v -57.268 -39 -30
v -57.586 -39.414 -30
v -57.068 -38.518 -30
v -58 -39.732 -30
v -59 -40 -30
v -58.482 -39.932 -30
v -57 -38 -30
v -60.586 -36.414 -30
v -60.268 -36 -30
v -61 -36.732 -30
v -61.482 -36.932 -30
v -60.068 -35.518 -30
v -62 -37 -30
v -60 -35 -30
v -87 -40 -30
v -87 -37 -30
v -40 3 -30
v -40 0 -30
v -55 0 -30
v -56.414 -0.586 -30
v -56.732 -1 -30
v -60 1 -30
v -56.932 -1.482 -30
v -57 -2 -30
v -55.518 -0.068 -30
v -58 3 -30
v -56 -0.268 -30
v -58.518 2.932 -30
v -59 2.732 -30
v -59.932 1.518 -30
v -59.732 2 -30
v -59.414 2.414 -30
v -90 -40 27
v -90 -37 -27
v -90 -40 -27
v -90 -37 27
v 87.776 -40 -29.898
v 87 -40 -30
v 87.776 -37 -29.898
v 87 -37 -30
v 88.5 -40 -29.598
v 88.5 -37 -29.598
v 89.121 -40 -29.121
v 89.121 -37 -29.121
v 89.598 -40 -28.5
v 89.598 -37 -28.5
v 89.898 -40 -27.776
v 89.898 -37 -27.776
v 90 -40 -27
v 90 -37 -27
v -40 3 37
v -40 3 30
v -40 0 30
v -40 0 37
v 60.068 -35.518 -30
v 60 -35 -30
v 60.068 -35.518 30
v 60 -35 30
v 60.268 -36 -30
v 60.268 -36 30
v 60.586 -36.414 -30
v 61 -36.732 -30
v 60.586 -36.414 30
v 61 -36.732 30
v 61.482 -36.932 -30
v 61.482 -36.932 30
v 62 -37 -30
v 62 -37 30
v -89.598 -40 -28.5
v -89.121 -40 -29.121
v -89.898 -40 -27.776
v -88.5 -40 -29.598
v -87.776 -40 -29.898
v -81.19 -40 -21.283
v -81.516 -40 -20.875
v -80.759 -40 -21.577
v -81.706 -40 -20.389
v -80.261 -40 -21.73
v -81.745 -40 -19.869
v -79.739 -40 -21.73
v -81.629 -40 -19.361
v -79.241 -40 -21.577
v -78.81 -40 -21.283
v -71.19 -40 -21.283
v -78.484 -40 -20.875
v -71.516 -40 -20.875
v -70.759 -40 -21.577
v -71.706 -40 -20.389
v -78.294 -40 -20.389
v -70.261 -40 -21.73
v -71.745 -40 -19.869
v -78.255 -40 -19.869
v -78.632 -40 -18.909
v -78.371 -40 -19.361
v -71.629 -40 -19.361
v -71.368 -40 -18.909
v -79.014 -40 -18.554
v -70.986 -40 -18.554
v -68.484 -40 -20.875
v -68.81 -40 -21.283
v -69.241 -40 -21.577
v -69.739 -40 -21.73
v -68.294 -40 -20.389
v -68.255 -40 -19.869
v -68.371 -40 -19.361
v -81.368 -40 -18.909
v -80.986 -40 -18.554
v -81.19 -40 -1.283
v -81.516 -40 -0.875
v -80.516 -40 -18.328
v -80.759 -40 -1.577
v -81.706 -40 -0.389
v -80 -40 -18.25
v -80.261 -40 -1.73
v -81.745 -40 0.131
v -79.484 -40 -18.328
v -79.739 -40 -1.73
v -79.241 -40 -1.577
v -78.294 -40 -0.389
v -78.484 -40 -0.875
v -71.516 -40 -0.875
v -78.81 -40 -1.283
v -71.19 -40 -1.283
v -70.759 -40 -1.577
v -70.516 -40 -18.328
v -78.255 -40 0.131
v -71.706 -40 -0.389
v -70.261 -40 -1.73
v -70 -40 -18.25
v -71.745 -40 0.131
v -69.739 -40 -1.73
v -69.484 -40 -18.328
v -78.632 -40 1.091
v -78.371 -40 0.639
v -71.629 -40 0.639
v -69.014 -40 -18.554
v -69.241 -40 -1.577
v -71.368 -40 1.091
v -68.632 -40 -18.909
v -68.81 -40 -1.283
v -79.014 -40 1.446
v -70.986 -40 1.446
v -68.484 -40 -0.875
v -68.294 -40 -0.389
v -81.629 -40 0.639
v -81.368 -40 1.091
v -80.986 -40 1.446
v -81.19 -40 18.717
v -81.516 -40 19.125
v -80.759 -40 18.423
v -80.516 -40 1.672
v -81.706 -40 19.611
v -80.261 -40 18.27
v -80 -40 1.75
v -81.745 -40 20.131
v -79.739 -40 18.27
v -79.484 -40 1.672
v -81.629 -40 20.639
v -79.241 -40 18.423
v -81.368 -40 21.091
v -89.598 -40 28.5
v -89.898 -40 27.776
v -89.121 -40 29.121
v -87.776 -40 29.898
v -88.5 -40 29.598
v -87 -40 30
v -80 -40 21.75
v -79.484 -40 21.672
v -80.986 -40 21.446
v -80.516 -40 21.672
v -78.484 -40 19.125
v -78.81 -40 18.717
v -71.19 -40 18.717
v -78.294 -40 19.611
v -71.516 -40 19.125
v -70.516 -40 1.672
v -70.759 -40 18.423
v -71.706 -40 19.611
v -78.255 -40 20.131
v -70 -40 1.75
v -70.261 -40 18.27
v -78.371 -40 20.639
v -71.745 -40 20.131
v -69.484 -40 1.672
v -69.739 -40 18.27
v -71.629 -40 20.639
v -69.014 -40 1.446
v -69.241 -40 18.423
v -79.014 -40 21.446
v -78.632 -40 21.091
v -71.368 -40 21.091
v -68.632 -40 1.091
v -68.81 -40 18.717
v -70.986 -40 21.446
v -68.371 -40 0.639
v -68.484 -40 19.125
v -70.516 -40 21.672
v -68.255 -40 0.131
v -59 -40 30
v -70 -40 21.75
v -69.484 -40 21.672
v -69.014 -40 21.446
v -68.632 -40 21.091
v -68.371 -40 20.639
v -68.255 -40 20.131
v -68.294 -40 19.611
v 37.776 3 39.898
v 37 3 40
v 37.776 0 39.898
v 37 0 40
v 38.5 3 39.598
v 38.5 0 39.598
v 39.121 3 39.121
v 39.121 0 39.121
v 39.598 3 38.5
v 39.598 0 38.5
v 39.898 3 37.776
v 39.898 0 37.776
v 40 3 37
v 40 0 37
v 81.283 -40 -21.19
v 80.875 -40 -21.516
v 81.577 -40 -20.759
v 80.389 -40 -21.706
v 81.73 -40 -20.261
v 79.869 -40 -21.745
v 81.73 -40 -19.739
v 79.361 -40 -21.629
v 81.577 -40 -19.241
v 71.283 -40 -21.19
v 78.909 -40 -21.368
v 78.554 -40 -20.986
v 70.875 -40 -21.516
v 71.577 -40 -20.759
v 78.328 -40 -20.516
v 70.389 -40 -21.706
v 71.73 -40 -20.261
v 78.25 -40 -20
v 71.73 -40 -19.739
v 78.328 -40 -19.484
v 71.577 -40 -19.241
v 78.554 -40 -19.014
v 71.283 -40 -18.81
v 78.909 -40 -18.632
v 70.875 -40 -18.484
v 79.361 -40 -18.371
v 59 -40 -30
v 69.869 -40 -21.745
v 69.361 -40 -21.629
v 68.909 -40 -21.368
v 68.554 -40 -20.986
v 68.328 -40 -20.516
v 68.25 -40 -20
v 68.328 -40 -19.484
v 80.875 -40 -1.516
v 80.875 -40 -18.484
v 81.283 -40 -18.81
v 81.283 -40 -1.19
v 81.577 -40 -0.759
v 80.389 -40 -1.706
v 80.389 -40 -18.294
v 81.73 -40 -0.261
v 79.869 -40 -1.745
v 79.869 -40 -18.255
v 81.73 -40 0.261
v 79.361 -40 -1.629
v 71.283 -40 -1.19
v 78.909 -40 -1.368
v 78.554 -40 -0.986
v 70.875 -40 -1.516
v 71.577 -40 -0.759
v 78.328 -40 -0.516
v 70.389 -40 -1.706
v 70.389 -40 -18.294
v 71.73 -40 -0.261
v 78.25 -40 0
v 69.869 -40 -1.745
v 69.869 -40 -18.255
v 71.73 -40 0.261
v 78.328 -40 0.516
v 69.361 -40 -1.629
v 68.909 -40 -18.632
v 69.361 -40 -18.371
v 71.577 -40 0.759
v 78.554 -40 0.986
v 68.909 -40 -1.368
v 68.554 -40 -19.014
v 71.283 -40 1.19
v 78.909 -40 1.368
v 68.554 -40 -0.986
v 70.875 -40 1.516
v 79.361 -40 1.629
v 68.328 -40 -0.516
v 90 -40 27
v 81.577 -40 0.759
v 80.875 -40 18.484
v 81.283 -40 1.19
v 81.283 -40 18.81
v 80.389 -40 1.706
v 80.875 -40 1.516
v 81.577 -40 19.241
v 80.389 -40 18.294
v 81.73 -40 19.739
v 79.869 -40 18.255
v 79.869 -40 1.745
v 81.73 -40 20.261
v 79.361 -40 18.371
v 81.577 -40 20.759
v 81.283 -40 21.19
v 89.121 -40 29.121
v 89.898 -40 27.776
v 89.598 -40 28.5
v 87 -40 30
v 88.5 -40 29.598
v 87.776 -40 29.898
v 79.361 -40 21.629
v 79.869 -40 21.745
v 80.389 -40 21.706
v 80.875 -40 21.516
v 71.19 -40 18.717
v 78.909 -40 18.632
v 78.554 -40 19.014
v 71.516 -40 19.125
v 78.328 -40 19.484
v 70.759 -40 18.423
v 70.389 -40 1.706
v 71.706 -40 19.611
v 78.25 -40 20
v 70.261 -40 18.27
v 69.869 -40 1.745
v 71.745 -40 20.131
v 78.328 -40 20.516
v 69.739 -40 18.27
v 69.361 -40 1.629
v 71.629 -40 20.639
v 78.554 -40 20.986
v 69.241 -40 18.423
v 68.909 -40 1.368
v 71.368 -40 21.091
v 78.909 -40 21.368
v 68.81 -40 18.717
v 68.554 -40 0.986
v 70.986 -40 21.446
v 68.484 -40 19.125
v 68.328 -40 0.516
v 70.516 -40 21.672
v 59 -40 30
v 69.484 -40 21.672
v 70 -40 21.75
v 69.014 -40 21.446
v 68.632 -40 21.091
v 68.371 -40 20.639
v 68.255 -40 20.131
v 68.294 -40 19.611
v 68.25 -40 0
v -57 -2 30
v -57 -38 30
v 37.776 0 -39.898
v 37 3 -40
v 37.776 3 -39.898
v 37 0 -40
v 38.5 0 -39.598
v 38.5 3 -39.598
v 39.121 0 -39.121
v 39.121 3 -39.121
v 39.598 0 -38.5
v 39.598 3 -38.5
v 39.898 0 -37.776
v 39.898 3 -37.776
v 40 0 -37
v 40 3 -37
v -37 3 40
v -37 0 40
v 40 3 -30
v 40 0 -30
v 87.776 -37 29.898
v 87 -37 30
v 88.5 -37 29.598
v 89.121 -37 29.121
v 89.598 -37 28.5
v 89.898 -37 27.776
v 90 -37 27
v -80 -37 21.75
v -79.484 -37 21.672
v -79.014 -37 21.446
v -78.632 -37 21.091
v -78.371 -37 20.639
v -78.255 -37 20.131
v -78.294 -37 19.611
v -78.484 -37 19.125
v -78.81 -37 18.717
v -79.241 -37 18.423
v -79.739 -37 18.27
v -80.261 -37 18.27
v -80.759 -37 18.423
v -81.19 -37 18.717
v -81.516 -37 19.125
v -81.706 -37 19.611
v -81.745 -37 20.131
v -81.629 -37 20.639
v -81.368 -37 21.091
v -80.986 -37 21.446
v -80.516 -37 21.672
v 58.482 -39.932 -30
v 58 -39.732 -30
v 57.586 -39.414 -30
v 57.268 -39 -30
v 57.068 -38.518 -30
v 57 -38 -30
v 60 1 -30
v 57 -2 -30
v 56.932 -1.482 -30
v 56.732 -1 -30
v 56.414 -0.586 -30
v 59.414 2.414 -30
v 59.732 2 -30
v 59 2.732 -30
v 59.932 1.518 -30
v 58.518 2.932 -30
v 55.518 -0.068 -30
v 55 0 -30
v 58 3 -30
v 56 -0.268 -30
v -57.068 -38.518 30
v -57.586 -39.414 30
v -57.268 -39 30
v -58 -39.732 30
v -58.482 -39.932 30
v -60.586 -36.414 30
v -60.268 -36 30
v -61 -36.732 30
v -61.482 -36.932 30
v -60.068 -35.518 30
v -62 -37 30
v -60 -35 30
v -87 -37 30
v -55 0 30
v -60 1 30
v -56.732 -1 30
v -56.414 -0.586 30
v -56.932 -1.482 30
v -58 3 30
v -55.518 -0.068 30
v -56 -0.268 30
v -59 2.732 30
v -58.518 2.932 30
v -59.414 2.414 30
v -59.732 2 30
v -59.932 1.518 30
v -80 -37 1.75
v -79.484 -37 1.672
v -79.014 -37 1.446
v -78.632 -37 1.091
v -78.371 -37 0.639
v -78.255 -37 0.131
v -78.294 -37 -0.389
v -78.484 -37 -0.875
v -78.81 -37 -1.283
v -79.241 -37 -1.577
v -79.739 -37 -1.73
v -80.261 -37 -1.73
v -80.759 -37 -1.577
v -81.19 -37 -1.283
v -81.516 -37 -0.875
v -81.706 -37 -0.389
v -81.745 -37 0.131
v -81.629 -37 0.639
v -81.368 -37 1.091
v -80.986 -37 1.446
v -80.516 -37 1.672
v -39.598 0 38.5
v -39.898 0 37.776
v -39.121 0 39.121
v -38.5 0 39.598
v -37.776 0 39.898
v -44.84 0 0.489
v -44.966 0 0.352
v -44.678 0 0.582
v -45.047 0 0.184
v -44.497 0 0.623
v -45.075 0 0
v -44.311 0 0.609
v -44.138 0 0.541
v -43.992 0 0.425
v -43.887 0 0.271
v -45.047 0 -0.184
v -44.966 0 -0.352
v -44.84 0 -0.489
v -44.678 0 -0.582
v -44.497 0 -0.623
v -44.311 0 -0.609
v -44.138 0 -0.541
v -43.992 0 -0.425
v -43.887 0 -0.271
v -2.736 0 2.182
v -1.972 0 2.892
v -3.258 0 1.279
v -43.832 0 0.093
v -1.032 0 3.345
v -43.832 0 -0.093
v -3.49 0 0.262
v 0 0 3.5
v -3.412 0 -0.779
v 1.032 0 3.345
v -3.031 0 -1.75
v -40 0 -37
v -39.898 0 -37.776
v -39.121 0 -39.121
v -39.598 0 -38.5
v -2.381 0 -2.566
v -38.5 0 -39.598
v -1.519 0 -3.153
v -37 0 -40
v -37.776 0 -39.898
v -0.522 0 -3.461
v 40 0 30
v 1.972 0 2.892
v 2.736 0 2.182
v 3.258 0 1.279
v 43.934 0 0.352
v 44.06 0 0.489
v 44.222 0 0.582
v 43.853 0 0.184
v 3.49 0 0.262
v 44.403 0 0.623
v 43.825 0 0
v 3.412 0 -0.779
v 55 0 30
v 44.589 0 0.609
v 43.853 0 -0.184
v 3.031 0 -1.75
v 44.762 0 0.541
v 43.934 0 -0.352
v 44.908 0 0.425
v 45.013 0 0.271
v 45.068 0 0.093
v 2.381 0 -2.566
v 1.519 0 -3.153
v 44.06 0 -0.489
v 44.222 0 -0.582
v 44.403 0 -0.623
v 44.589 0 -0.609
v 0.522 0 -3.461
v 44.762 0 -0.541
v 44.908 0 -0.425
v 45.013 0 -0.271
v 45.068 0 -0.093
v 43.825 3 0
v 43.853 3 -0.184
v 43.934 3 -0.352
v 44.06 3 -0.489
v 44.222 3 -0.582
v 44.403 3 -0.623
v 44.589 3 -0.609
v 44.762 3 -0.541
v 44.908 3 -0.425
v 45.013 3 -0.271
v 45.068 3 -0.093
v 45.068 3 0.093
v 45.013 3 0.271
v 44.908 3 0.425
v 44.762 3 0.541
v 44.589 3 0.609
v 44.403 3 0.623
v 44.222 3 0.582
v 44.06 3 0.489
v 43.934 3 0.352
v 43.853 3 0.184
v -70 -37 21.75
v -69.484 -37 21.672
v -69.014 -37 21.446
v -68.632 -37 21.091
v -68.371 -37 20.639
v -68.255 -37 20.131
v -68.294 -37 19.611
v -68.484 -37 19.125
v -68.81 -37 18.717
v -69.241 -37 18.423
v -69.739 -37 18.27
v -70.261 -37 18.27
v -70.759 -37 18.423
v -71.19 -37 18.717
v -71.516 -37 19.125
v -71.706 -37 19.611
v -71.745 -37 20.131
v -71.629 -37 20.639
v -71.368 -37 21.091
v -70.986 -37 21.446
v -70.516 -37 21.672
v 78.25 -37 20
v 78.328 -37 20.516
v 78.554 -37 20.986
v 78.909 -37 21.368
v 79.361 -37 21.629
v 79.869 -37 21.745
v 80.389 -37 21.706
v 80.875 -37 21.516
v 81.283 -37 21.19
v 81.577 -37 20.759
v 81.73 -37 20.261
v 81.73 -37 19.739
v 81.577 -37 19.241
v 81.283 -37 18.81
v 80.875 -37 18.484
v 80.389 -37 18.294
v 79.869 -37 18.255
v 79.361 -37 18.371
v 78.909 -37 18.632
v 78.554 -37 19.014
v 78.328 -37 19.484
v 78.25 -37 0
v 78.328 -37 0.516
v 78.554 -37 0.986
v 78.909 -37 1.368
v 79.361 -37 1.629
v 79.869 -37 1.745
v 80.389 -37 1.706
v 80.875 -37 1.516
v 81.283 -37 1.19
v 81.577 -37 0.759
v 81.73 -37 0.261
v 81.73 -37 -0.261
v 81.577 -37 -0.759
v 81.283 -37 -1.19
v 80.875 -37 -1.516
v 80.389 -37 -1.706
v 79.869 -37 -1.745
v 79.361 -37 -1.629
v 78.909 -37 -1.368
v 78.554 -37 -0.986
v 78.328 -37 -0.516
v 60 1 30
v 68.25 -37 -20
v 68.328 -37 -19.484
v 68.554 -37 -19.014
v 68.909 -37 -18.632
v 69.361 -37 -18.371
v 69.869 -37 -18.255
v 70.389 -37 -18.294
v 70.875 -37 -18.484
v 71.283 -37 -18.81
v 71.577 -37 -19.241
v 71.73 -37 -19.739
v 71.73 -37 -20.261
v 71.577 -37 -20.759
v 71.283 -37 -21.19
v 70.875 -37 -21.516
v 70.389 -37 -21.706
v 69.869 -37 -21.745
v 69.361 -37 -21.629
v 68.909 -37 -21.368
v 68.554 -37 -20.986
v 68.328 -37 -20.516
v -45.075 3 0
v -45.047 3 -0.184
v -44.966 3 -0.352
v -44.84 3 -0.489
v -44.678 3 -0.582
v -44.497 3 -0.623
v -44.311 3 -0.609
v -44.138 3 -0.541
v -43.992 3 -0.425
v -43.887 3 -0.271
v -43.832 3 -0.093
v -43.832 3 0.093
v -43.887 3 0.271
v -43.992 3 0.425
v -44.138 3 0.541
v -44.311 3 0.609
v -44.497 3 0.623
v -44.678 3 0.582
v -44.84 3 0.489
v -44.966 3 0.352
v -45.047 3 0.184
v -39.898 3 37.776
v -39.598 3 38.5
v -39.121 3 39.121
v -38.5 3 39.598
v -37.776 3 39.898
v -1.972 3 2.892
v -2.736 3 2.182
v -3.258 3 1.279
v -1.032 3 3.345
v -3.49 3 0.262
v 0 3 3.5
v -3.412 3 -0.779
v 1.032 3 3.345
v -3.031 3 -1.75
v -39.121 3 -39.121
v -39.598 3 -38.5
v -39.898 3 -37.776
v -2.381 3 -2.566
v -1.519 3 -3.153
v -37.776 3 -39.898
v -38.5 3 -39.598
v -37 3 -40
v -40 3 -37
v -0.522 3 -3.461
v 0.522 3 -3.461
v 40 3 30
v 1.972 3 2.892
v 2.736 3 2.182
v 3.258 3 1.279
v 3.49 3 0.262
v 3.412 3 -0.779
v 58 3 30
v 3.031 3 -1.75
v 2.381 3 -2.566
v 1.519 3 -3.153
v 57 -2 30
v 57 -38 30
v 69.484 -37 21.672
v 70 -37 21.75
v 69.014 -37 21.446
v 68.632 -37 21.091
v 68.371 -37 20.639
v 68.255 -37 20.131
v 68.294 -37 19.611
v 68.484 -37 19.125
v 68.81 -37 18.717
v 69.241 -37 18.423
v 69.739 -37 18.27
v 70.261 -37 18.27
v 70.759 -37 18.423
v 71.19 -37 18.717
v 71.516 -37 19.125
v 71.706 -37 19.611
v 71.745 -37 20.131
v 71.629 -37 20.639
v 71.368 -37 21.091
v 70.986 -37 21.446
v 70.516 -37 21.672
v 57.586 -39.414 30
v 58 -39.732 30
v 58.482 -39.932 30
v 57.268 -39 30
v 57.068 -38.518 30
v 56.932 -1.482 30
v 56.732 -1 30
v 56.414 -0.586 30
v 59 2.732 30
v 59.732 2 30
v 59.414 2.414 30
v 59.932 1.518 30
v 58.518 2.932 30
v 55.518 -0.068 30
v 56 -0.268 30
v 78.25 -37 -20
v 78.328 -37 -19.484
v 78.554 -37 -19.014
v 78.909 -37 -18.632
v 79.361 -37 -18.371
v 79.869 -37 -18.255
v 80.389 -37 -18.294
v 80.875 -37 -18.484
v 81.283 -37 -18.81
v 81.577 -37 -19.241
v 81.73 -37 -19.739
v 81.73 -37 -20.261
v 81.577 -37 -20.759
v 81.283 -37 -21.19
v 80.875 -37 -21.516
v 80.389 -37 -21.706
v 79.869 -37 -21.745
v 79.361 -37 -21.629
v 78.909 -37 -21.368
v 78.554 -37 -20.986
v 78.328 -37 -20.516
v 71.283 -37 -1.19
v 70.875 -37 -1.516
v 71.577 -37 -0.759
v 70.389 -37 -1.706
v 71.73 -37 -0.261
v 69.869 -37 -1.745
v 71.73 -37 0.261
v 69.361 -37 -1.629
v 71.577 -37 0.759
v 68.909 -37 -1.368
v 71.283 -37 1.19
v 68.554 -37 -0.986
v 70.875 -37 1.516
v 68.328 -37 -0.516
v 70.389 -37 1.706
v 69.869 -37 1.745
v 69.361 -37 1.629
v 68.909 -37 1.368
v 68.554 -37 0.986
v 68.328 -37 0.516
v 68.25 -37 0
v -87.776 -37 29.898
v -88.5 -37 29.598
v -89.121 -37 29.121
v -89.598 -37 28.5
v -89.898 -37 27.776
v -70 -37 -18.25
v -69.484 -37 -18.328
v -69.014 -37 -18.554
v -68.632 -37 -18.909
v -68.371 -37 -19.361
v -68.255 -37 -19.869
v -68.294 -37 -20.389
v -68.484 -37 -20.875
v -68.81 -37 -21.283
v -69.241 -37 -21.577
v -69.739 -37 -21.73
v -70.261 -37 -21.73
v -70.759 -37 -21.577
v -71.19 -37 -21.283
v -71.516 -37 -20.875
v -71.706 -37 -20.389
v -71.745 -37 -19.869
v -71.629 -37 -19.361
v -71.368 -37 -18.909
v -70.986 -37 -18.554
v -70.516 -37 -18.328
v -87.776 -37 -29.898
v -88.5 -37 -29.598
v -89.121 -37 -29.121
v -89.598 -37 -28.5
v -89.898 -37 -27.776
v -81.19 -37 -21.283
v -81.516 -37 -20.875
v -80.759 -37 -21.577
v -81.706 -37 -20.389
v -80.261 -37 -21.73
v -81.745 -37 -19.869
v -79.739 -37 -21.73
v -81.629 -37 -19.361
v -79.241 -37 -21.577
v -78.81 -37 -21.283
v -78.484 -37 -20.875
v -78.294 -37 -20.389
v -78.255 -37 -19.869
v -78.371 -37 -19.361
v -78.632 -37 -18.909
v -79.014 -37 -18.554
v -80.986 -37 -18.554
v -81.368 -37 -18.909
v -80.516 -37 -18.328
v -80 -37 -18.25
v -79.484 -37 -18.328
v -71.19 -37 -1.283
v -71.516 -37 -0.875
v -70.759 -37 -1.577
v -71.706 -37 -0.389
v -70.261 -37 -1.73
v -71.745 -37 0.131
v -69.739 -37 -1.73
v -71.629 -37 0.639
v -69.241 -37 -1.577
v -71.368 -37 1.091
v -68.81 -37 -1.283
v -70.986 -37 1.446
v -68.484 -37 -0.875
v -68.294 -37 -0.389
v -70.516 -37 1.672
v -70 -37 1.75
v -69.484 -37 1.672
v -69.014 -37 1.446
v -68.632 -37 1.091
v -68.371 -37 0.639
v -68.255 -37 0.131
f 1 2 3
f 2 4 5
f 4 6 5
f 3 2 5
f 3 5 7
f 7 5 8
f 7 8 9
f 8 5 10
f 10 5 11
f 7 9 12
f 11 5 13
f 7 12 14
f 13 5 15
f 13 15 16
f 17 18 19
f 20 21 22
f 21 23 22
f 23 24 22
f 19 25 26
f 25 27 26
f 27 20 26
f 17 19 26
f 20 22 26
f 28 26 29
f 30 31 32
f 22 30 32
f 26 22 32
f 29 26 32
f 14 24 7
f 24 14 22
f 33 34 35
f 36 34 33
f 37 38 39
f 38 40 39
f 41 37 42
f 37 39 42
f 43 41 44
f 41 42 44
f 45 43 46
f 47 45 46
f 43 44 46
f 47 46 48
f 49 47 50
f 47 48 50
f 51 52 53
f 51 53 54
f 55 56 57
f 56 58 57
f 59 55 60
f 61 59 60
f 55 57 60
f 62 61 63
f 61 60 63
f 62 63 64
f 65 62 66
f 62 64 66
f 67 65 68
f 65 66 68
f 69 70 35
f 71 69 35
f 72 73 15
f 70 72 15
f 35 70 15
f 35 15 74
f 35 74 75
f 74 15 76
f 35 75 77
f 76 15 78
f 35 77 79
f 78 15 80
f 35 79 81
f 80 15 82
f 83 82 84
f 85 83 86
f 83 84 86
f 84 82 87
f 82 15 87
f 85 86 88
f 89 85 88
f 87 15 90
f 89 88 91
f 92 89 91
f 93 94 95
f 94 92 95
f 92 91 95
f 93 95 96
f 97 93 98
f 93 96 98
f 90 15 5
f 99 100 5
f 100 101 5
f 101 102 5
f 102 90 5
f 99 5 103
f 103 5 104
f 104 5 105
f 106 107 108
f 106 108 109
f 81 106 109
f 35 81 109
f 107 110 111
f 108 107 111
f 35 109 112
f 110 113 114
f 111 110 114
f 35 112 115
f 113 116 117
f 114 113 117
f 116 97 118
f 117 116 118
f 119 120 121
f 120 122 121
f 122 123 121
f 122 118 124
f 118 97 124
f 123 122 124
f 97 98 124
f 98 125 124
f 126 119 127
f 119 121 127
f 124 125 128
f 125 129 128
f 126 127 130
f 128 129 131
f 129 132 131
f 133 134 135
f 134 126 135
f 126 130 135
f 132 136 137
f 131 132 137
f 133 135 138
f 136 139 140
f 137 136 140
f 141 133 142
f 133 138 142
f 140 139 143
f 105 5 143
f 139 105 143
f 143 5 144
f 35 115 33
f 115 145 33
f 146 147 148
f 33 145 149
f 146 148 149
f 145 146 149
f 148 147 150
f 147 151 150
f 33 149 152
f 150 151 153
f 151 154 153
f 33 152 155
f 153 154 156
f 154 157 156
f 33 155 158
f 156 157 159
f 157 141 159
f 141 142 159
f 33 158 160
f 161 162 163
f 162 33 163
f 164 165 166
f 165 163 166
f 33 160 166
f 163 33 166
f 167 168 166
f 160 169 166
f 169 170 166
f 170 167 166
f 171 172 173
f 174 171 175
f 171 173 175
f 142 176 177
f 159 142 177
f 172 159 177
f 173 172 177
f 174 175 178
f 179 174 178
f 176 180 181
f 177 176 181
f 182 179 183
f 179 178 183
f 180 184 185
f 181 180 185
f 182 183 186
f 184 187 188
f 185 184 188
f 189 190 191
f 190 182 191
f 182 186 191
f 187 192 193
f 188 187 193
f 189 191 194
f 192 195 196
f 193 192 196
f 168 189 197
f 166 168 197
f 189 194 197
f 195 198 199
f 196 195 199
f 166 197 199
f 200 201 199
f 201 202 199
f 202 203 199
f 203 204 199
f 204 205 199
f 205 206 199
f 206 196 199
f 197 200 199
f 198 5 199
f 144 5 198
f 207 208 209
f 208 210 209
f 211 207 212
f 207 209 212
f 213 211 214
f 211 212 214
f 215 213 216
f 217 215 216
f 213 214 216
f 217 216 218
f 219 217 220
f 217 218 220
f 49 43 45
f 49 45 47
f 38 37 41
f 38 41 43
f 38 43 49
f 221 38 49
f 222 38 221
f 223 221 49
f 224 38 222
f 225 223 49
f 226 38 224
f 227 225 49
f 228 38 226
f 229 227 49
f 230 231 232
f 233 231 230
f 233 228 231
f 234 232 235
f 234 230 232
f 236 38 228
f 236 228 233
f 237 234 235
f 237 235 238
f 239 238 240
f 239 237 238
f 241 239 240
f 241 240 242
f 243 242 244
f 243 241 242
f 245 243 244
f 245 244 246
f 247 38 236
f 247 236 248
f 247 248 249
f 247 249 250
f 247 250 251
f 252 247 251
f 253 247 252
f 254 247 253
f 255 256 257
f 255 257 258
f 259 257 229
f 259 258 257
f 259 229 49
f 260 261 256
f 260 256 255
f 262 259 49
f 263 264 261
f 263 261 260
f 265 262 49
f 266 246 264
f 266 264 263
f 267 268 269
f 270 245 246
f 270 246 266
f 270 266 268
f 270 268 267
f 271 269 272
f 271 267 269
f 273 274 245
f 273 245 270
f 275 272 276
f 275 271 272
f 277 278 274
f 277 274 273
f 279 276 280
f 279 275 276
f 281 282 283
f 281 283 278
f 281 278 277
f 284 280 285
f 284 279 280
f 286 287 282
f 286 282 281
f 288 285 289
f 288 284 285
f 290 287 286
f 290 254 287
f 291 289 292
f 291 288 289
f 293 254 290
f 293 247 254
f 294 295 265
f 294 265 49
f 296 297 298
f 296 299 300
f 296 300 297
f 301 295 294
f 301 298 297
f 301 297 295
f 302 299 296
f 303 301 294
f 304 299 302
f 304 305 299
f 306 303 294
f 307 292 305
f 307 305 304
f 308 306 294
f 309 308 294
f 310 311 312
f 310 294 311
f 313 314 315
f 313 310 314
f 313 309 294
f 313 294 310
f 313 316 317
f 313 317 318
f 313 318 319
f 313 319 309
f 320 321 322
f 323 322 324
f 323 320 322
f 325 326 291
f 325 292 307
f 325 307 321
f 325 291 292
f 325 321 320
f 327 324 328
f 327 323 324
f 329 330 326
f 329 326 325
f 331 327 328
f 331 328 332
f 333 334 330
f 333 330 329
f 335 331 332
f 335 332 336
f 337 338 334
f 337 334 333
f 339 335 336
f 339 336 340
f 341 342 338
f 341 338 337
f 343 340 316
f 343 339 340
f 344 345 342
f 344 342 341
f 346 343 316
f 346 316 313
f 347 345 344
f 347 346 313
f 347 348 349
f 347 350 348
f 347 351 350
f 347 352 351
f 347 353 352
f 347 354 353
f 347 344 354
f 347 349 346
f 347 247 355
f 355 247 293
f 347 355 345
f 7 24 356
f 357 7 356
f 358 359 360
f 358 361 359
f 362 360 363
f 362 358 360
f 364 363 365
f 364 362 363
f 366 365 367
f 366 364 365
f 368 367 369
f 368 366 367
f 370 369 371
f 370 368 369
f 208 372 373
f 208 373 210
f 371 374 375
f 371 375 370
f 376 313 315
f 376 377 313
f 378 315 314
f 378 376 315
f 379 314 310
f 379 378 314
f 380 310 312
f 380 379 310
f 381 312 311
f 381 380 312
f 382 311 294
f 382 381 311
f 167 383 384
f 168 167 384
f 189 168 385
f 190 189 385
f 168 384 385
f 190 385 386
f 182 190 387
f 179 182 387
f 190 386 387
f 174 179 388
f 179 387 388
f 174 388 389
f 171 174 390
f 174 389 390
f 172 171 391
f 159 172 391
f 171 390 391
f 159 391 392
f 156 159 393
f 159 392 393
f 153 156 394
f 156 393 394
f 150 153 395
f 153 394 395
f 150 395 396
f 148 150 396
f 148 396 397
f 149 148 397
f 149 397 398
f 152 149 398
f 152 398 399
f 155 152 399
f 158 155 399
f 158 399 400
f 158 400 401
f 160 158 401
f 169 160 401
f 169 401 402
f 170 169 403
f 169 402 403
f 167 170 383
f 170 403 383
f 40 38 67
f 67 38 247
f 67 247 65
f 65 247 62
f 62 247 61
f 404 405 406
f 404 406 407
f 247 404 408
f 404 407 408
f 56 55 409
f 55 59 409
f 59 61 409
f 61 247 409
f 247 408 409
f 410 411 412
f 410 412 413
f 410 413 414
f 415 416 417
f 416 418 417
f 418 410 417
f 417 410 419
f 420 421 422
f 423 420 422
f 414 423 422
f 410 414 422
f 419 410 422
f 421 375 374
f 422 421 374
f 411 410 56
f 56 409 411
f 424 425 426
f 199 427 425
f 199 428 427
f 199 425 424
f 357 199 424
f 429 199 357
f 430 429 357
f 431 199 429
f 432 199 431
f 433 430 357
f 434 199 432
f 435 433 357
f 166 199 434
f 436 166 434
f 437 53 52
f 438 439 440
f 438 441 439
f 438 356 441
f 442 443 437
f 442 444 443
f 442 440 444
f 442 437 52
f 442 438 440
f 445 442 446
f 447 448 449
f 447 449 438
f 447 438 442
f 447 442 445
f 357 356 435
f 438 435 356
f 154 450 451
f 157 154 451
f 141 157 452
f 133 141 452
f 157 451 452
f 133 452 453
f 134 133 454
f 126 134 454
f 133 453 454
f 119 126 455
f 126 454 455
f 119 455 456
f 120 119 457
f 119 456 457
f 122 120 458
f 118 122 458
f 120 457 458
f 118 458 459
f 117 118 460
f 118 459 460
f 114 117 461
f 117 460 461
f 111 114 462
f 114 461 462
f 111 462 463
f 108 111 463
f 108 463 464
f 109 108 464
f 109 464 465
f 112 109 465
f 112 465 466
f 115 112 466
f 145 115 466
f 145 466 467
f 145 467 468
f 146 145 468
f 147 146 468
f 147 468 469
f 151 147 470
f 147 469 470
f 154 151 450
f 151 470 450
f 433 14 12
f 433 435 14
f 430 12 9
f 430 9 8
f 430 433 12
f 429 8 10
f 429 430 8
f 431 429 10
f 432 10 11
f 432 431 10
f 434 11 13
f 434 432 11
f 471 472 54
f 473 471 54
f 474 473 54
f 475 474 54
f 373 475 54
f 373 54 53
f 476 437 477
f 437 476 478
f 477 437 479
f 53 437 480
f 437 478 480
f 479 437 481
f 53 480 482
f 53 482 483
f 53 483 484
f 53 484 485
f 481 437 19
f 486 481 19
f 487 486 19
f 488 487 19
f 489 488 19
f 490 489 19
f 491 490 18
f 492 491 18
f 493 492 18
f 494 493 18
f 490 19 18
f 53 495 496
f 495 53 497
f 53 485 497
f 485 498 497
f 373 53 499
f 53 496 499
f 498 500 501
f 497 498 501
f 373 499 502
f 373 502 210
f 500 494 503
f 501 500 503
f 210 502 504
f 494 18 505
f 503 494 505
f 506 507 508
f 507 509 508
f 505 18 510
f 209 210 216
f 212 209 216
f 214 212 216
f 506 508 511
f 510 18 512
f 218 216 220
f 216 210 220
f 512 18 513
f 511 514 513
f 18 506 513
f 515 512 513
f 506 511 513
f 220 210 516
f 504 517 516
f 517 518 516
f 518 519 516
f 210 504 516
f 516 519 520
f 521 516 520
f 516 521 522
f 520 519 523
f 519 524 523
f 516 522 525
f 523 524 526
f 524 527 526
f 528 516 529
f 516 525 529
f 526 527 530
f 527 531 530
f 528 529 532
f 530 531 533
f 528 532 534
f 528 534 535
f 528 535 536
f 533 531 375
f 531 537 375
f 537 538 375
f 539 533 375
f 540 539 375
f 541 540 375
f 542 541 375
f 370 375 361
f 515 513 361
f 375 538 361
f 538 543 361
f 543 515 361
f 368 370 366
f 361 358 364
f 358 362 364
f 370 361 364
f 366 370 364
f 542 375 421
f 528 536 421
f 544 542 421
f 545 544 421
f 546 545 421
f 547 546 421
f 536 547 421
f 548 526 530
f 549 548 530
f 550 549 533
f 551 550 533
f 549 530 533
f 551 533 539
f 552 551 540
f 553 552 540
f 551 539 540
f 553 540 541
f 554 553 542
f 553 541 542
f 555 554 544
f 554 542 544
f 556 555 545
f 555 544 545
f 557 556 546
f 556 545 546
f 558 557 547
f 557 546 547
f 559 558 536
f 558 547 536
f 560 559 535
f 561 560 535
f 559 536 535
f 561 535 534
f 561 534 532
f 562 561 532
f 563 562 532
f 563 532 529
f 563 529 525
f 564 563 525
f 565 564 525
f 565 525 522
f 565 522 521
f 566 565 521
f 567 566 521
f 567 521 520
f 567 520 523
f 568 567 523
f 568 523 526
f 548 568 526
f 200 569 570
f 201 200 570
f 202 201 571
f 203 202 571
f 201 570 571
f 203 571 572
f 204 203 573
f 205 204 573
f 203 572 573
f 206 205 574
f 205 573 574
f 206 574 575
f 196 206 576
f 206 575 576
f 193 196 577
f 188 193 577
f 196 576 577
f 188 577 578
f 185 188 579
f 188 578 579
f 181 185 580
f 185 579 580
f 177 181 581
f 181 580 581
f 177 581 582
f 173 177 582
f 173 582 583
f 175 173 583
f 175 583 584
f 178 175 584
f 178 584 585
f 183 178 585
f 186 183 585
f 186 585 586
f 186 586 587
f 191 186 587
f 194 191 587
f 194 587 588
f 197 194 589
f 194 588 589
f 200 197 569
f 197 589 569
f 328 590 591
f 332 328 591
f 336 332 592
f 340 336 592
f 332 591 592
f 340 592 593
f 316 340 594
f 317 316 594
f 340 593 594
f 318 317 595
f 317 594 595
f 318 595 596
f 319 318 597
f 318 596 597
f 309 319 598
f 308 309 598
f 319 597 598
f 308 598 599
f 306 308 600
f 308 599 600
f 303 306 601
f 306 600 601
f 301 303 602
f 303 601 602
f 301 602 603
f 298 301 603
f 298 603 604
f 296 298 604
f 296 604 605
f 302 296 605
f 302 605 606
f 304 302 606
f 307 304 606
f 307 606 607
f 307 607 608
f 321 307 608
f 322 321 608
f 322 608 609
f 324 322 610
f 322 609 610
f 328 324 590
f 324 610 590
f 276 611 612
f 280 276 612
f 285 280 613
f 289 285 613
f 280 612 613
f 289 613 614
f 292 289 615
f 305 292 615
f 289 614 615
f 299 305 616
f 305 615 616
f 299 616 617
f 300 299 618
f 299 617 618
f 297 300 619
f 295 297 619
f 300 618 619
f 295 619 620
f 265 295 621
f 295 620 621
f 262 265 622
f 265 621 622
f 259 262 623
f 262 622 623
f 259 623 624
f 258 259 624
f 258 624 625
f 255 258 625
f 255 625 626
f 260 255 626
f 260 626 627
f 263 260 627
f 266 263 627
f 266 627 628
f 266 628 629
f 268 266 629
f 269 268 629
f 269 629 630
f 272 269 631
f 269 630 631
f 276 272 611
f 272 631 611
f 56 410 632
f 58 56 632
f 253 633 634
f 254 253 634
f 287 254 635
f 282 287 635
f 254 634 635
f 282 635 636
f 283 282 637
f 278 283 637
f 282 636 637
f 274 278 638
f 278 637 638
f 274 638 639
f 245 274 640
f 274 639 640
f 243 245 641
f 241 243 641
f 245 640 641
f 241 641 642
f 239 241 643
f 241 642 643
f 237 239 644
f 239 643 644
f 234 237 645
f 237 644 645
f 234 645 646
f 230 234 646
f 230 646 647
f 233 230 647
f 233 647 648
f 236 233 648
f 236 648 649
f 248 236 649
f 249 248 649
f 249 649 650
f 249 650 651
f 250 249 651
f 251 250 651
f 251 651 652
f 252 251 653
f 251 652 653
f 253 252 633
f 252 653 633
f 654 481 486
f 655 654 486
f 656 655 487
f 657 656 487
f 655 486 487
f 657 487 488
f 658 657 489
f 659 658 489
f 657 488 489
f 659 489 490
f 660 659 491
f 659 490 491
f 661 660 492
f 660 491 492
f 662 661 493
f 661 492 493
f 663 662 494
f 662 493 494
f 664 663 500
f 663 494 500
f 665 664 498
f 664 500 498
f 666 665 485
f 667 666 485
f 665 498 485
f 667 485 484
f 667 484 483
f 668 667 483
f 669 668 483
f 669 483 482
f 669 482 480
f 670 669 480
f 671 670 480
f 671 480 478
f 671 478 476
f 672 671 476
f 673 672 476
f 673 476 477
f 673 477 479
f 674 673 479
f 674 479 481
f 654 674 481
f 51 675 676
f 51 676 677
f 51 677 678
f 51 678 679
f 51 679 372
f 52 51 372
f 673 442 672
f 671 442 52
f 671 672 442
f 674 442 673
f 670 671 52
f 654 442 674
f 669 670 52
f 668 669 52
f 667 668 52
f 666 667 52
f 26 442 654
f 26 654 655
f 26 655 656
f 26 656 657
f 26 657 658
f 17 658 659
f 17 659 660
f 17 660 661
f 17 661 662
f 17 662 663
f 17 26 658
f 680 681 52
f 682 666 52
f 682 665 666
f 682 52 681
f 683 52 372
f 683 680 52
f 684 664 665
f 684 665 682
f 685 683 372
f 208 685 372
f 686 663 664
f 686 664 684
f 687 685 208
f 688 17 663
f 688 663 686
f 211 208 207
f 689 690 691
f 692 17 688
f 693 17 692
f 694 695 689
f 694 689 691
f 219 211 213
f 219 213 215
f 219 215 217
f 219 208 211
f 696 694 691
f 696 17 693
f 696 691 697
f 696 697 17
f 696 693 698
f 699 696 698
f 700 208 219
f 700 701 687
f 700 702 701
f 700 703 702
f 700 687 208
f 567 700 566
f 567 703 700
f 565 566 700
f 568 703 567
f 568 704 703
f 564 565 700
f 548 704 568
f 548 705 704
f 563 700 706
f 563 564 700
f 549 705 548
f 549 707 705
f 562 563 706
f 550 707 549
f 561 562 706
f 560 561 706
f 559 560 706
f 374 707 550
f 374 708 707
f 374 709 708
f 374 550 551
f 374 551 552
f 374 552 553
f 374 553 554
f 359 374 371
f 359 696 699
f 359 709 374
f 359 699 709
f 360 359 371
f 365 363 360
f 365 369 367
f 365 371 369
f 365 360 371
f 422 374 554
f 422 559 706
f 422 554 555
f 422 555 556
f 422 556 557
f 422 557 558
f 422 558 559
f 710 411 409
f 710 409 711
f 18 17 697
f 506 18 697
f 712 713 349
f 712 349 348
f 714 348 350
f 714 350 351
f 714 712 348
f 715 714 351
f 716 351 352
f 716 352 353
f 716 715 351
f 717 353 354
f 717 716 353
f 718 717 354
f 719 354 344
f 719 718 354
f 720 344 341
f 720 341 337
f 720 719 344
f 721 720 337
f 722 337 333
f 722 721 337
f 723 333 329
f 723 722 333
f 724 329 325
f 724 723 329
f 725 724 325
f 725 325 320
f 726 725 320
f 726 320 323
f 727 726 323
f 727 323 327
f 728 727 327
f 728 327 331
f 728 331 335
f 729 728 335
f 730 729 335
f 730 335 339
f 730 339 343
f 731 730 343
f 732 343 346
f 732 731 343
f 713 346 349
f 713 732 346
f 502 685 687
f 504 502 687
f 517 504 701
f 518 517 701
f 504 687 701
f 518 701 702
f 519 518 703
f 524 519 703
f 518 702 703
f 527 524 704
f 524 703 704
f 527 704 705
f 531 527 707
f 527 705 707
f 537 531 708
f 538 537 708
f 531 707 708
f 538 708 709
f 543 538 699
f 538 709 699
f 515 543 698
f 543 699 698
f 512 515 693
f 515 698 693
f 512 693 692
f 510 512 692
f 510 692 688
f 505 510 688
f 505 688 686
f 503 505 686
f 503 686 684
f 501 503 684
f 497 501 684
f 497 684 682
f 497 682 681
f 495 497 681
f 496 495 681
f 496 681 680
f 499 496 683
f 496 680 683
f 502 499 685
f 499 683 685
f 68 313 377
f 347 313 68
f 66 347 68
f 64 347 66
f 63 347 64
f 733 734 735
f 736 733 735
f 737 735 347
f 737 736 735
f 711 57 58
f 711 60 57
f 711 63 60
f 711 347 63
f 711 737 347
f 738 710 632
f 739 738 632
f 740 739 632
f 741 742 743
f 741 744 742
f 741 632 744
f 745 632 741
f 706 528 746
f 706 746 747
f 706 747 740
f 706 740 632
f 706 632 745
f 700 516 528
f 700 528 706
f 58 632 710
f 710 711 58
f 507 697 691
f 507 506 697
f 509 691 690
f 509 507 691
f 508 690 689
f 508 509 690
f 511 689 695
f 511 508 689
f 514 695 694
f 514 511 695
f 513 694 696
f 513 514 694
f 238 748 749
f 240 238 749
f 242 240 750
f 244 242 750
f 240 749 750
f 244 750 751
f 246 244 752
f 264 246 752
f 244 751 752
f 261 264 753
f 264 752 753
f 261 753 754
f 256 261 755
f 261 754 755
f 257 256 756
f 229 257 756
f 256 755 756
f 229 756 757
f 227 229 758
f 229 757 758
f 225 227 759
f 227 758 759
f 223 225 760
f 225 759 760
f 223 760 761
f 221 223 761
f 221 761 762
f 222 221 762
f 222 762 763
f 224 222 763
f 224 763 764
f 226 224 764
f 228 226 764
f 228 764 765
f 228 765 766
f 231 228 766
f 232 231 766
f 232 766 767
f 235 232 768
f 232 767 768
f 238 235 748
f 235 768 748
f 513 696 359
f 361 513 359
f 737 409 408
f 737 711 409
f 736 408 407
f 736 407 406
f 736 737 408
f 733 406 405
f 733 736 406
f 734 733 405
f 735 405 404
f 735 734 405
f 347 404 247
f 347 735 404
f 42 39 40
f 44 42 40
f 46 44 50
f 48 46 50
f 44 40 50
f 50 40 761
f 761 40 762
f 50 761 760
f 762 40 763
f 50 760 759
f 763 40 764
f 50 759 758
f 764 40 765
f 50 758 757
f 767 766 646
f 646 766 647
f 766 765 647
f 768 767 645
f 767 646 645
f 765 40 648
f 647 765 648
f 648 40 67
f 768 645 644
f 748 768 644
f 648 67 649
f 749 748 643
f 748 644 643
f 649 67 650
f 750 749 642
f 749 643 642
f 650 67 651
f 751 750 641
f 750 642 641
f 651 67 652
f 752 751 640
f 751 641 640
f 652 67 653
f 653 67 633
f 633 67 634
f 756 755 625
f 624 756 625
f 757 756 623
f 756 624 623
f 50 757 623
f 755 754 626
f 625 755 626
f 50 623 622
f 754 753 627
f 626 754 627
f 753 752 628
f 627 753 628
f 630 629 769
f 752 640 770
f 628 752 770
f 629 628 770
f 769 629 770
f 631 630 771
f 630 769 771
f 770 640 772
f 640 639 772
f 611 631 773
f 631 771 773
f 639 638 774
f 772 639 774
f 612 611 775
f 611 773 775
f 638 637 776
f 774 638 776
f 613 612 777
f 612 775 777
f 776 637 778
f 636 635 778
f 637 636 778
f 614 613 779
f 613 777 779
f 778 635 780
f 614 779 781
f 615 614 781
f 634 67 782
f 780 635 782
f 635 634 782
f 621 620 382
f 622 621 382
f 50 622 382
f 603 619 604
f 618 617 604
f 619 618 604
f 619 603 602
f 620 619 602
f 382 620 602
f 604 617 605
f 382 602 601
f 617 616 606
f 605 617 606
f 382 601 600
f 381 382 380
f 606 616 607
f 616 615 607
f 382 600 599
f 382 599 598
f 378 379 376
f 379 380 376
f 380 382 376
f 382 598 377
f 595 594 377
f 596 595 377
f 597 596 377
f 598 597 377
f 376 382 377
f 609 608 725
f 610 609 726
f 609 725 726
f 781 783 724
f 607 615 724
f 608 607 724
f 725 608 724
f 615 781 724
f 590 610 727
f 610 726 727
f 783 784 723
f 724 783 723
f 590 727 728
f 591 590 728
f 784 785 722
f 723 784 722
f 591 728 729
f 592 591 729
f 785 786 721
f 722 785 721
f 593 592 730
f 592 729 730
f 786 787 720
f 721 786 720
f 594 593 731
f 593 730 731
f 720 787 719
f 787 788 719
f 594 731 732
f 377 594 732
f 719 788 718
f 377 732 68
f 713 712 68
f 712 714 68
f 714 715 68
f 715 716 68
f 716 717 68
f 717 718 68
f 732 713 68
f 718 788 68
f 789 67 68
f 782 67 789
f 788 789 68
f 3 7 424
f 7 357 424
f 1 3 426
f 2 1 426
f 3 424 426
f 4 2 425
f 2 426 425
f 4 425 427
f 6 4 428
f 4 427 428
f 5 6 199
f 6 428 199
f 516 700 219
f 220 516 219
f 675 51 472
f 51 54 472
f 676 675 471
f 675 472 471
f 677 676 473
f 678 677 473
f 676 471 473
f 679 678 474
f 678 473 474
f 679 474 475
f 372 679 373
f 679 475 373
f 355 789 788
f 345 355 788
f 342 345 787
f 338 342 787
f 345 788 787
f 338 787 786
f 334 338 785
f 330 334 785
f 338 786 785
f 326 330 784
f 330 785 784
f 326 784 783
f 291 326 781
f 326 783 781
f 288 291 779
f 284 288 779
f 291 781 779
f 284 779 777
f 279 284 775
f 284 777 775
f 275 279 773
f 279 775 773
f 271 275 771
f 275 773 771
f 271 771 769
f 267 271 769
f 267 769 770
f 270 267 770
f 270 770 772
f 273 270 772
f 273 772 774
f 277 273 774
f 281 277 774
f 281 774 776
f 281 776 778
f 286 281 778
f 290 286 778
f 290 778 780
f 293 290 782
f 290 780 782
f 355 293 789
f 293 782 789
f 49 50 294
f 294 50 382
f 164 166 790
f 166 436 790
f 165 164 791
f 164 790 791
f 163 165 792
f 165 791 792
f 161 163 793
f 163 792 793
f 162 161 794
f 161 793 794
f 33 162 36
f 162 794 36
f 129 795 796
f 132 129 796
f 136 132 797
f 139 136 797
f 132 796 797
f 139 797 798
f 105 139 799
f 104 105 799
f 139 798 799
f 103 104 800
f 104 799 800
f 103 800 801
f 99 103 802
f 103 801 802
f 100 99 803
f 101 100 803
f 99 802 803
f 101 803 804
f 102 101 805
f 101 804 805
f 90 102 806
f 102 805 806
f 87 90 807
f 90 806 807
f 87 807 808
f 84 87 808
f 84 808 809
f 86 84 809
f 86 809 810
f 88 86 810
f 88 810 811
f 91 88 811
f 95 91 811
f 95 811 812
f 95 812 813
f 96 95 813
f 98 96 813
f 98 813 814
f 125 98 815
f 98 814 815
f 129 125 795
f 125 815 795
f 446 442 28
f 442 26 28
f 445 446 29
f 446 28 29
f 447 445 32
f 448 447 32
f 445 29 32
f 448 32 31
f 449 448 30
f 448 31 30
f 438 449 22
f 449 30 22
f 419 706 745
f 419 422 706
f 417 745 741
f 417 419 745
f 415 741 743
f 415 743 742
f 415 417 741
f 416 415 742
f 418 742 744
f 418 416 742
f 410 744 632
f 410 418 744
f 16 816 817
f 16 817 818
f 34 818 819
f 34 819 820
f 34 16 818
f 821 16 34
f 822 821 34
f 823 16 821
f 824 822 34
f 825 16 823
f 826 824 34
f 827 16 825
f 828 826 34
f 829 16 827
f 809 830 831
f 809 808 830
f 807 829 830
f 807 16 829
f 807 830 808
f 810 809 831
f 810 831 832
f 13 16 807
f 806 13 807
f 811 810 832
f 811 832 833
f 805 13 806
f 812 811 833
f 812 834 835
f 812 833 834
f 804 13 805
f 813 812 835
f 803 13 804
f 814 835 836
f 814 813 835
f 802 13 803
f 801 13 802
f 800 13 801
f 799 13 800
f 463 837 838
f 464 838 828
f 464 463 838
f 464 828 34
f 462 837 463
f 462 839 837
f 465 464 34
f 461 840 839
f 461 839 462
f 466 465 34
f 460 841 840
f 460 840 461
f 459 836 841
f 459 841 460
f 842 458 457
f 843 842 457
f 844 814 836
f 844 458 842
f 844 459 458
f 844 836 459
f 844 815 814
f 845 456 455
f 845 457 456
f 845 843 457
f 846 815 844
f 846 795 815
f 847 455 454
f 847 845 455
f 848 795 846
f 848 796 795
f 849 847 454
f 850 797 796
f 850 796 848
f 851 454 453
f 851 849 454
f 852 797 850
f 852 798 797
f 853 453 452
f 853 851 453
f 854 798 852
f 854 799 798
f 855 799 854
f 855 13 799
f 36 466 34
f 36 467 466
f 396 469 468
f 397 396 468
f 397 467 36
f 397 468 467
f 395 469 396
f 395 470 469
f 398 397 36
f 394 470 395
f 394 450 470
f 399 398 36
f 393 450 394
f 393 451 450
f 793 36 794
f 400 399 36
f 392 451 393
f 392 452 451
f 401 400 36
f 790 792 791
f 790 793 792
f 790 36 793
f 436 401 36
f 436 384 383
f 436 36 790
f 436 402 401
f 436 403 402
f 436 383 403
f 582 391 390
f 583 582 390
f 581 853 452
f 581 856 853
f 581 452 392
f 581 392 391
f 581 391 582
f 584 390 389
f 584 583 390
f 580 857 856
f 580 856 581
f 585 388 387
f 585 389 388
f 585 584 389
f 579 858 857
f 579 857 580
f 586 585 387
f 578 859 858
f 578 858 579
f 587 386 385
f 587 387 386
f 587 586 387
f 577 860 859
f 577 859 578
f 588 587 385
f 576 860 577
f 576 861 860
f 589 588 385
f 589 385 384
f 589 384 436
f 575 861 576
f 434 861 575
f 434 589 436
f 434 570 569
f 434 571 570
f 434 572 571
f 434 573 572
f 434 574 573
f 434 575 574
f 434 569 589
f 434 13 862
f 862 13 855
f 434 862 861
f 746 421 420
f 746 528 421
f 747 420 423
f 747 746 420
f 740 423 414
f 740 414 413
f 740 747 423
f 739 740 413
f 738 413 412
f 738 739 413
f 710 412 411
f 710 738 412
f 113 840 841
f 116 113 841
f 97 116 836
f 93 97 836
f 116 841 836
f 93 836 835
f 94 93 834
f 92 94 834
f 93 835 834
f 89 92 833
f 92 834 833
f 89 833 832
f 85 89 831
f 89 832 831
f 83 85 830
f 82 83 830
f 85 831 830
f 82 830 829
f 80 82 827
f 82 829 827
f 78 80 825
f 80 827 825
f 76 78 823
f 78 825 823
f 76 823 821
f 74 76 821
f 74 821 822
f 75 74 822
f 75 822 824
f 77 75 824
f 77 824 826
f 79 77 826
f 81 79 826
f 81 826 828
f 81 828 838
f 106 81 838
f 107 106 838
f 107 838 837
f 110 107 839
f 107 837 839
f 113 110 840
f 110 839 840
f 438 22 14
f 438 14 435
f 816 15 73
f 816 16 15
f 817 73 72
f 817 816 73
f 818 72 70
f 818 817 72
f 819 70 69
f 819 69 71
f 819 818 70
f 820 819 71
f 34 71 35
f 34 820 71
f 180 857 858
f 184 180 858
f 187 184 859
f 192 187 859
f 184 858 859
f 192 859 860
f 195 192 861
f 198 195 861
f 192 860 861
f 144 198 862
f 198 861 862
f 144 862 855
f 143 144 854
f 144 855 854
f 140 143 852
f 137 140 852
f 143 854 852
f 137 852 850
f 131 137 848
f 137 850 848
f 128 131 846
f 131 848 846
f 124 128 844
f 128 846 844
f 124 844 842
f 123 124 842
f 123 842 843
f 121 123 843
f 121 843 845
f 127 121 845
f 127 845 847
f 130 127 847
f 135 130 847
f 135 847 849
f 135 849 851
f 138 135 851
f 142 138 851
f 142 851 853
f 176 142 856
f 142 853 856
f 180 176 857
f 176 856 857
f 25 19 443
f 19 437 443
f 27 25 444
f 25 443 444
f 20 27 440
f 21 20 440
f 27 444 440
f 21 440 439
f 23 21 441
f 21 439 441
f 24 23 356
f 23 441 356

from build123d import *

# Parameters (mm, degrees)
SKETCH_1_W                  = 120
SKETCH_1_H                  = 60
EXTRUDE_1_DEPTH             = 3
SKETCH_2_W                  = 3
SKETCH_2_H                  = 60
EXTRUDE_2_DEPTH             = 40
SKETCH_3_W                  = 60
SKETCH_3_H                  = 3
EXTRUDE_3_DEPTH             = 30
SKETCH_4_R                  = 1.75
CUT_EXTRUDE_1_DEPTH         = 3
PATTERN_LINEAR_1_COUNT      = 3
PATTERN_LINEAR_1_PITCH      = 20
PATTERN_LINEAR_1_COUNT_DIR2 = 2
PATTERN_LINEAR_1_PITCH_DIR2 = 10
MIRROR_1_COPY_1_SKETCH_R    = 1.75
MIRROR_1_COPY_1_DEPTH       = 3
MIRROR_1_COPY_2_SKETCH_R    = 1.75
MIRROR_1_COPY_2_DEPTH       = 3
MIRROR_1_COPY_3_SKETCH_R    = 1.75
MIRROR_1_COPY_3_DEPTH       = 3
MIRROR_1_COPY_4_SKETCH_R    = 1.75
MIRROR_1_COPY_4_DEPTH       = 3
MIRROR_1_COPY_5_SKETCH_R    = 1.75
MIRROR_1_COPY_5_DEPTH       = 3
SKETCH_5_R                  = 3.5
CUT_EXTRUDE_2_DEPTH         = 3
SKETCH_6_R                  = 0.5
CUT_EXTRUDE_3_DEPTH         = 3
SKETCH_7_W                  = 80
SKETCH_7_H                  = 10
EXTRUDE_4_DEPTH             = 3
FILLET_1_R                  = 3
FILLET_2_R                  = 3
HOLE_WIZARD_M1_6_1_D        = 1.25
FILLET_3_R                  = 2
FILLET_4_R                  = 2
FILLET_5_R                  = 3


with BuildPart() as part:
    # 草图1 → 凸台-拉伸1 (new body)
    with BuildSketch(Plane(origin=(0, 0, 0), x_dir=(1, 0, 0), z_dir=(0, 1, 0))):
        Rectangle(SKETCH_1_W, SKETCH_1_H)
    extrude(amount=EXTRUDE_1_DEPTH)

    # 草图2 → 凸台-拉伸2 (add)
    with BuildSketch(Plane.XZ):
        with Locations((-58.5, 0)):
            Rectangle(SKETCH_2_W, SKETCH_2_H)
    extrude_2 = extrude(amount=EXTRUDE_2_DEPTH)

    # 草图3 → 凸台-拉伸3 (add)
    with BuildSketch(Plane.ZY.offset(60)):
        with Locations((0, -38.5)):
            Rectangle(SKETCH_3_W, SKETCH_3_H)
    extrude_3 = extrude(amount=EXTRUDE_3_DEPTH)

    # 草图4 → 切除-拉伸1 (cut)
    with BuildSketch(Plane(origin=(0, -37, 0), x_dir=(1, 0, 0), z_dir=(0, 1, 0))):
        with Locations(Location((-70, -20, 0), (0, 0, 270))):
            Circle(SKETCH_4_R)
    cut_extrude_1 = extrude(amount=-CUT_EXTRUDE_1_DEPTH, mode=Mode.SUBTRACT)

    # 阵列(线性)1: Cut-Extrude 1 3 × 2
    with Locations(*[(-j * PATTERN_LINEAR_1_PITCH_DIR2, 0, -i * PATTERN_LINEAR_1_PITCH) for i in range(PATTERN_LINEAR_1_COUNT) for j in range(PATTERN_LINEAR_1_COUNT_DIR2) if (i, j) != (0, 0)]):
        add(cut_extrude_1, mode=Mode.SUBTRACT)

    # 镜向1: 凸台-拉伸2, 凸台-拉伸3, 切除-拉伸1 across plane
    add(extrude_2.mirror(Plane(origin=(0, 0, 0), x_dir=(0, 0, 1), z_dir=(1, 0, 0))))
    add(extrude_3.mirror(Plane(origin=(0, 0, 0), x_dir=(0, 0, 1), z_dir=(1, 0, 0))))
    add(cut_extrude_1.mirror(Plane(origin=(0, 0, 0), x_dir=(0, 0, 1), z_dir=(1, 0, 0))), mode=Mode.SUBTRACT)

    # 镜向1 copy 1 sketch → 镜向1 copy 1 (cut)
    with BuildSketch(Plane(origin=(10, -37, 0), x_dir=(-1, 0, 0), z_dir=(0, 1, 0))):
        with Locations((-70, 20)):
            Circle(MIRROR_1_COPY_1_SKETCH_R)
    extrude(amount=-MIRROR_1_COPY_1_DEPTH, mode=Mode.SUBTRACT)

    # 镜向1 copy 2 sketch → 镜向1 copy 2 (cut)
    with BuildSketch(Plane(origin=(0, -37, -20), x_dir=(-1, 0, 0), z_dir=(0, 1, 0))):
        with Locations((-70, 20)):
            Circle(MIRROR_1_COPY_2_SKETCH_R)
    extrude(amount=-MIRROR_1_COPY_2_DEPTH, mode=Mode.SUBTRACT)

    # 镜向1 copy 3 sketch → 镜向1 copy 3 (cut)
    with BuildSketch(Plane(origin=(10, -37, -20), x_dir=(-1, 0, 0), z_dir=(0, 1, 0))):
        with Locations((-70, 20)):
            Circle(MIRROR_1_COPY_3_SKETCH_R)
    extrude(amount=-MIRROR_1_COPY_3_DEPTH, mode=Mode.SUBTRACT)

    # 镜向1 copy 4 sketch → 镜向1 copy 4 (cut)
    with BuildSketch(Plane(origin=(0, -37, -40), x_dir=(-1, 0, 0), z_dir=(0, 1, 0))):
        with Locations((-70, 20)):
            Circle(MIRROR_1_COPY_4_SKETCH_R)
    extrude(amount=-MIRROR_1_COPY_4_DEPTH, mode=Mode.SUBTRACT)

    # 镜向1 copy 5 sketch → 镜向1 copy 5 (cut)
    with BuildSketch(Plane(origin=(10, -37, -40), x_dir=(-1, 0, 0), z_dir=(0, 1, 0))):
        with Locations((-70, 20)):
            Circle(MIRROR_1_COPY_5_SKETCH_R)
    extrude(amount=-MIRROR_1_COPY_5_DEPTH, mode=Mode.SUBTRACT)

    # 草图5 → 切除-拉伸2 (cut)
    with BuildSketch(Plane(origin=(0, 3, 0), x_dir=(1, 0, 0), z_dir=(0, 1, 0))):
        with Locations(Location((0, 0, 0), (0, 0, 270))):
            Circle(SKETCH_5_R)
    extrude(amount=-CUT_EXTRUDE_2_DEPTH, mode=Mode.SUBTRACT)

    # 草图6 → 切除-拉伸3 (cut)
    with BuildSketch(Plane(origin=(0, 3, 0), x_dir=(1, 0, 0), z_dir=(0, 1, 0))):
        with Locations(Location((44.45, 0, 0), (0, 0, 270))):
            Circle(SKETCH_6_R)
    cut_extrude_3 = extrude(amount=-CUT_EXTRUDE_3_DEPTH, mode=Mode.SUBTRACT)

    # 镜向2: 切除-拉伸3 across plane
    add(cut_extrude_3.mirror(Plane(origin=(0, 0, 0), x_dir=(0, 0, 1), z_dir=(1, 0, 0))), mode=Mode.SUBTRACT)

    # 草图7 → 凸台-拉伸4 (add)
    with BuildSketch(Plane(origin=(0, 3, 0), x_dir=(1, 0, 0), z_dir=(0, 1, 0))):
        with Locations((0, 35)):
            Rectangle(SKETCH_7_W, SKETCH_7_H)
    extrude_4 = extrude(amount=-EXTRUDE_4_DEPTH)

    # 镜向3: 凸台-拉伸4 across plane
    add(extrude_4.mirror(Plane.XY))

    # 圆角1
    fillet_1_edges = [part.edges().sort_by_distance(p)[0] for p in [
        (-40, 1.5, 40),
    ]]
    fillet(fillet_1_edges, radius=FILLET_1_R)

    # 圆角2
    fillet_2_edges = [part.edges().sort_by_distance(p)[0] for p in [
        (-40, 1.5, -40),
        (40, 1.5, -40),
        (40, 1.5, 40),
    ]]
    fillet(fillet_2_edges, radius=FILLET_2_R)

    # M1.6 螺纹孔1 (through all)
    with Locations(Plane(origin=(0, 3, 0), x_dir=(1, 0, 0), z_dir=(0, 1, 0))):
        with Locations((44.45, 0), (-44.45, 0)):
            Hole(HOLE_WIZARD_M1_6_1_D / 2)

    # 圆角3
    fillet_3_edges = [part.edges().sort_by_distance(p)[0] for p in [
        (-57, 0, 0),
        (-60, 3, 0),
    ]]
    fillet(fillet_3_edges, radius=FILLET_3_R)

    # 圆角4
    fillet_4_edges = [part.edges().sort_by_distance(p)[0] for p in [
        (60, 3, 0),
        (-57, -40, 0),
        (-60, -37, 0),
        (57, -40, 0),
        (57, 0, 0),
        (60, -37, 0),
    ]]
    fillet(fillet_4_edges, radius=FILLET_4_R)

    # 圆角5
    fillet_5_edges = [part.edges().sort_by_distance(p)[0] for p in [
        (-90, -38.5, -30),
        (-90, -38.5, 30),
        (90, -38.5, -30),
        (90, -38.5, 30),
    ]]
    fillet(fillet_5_edges, radius=FILLET_5_R)


solid = part.part
